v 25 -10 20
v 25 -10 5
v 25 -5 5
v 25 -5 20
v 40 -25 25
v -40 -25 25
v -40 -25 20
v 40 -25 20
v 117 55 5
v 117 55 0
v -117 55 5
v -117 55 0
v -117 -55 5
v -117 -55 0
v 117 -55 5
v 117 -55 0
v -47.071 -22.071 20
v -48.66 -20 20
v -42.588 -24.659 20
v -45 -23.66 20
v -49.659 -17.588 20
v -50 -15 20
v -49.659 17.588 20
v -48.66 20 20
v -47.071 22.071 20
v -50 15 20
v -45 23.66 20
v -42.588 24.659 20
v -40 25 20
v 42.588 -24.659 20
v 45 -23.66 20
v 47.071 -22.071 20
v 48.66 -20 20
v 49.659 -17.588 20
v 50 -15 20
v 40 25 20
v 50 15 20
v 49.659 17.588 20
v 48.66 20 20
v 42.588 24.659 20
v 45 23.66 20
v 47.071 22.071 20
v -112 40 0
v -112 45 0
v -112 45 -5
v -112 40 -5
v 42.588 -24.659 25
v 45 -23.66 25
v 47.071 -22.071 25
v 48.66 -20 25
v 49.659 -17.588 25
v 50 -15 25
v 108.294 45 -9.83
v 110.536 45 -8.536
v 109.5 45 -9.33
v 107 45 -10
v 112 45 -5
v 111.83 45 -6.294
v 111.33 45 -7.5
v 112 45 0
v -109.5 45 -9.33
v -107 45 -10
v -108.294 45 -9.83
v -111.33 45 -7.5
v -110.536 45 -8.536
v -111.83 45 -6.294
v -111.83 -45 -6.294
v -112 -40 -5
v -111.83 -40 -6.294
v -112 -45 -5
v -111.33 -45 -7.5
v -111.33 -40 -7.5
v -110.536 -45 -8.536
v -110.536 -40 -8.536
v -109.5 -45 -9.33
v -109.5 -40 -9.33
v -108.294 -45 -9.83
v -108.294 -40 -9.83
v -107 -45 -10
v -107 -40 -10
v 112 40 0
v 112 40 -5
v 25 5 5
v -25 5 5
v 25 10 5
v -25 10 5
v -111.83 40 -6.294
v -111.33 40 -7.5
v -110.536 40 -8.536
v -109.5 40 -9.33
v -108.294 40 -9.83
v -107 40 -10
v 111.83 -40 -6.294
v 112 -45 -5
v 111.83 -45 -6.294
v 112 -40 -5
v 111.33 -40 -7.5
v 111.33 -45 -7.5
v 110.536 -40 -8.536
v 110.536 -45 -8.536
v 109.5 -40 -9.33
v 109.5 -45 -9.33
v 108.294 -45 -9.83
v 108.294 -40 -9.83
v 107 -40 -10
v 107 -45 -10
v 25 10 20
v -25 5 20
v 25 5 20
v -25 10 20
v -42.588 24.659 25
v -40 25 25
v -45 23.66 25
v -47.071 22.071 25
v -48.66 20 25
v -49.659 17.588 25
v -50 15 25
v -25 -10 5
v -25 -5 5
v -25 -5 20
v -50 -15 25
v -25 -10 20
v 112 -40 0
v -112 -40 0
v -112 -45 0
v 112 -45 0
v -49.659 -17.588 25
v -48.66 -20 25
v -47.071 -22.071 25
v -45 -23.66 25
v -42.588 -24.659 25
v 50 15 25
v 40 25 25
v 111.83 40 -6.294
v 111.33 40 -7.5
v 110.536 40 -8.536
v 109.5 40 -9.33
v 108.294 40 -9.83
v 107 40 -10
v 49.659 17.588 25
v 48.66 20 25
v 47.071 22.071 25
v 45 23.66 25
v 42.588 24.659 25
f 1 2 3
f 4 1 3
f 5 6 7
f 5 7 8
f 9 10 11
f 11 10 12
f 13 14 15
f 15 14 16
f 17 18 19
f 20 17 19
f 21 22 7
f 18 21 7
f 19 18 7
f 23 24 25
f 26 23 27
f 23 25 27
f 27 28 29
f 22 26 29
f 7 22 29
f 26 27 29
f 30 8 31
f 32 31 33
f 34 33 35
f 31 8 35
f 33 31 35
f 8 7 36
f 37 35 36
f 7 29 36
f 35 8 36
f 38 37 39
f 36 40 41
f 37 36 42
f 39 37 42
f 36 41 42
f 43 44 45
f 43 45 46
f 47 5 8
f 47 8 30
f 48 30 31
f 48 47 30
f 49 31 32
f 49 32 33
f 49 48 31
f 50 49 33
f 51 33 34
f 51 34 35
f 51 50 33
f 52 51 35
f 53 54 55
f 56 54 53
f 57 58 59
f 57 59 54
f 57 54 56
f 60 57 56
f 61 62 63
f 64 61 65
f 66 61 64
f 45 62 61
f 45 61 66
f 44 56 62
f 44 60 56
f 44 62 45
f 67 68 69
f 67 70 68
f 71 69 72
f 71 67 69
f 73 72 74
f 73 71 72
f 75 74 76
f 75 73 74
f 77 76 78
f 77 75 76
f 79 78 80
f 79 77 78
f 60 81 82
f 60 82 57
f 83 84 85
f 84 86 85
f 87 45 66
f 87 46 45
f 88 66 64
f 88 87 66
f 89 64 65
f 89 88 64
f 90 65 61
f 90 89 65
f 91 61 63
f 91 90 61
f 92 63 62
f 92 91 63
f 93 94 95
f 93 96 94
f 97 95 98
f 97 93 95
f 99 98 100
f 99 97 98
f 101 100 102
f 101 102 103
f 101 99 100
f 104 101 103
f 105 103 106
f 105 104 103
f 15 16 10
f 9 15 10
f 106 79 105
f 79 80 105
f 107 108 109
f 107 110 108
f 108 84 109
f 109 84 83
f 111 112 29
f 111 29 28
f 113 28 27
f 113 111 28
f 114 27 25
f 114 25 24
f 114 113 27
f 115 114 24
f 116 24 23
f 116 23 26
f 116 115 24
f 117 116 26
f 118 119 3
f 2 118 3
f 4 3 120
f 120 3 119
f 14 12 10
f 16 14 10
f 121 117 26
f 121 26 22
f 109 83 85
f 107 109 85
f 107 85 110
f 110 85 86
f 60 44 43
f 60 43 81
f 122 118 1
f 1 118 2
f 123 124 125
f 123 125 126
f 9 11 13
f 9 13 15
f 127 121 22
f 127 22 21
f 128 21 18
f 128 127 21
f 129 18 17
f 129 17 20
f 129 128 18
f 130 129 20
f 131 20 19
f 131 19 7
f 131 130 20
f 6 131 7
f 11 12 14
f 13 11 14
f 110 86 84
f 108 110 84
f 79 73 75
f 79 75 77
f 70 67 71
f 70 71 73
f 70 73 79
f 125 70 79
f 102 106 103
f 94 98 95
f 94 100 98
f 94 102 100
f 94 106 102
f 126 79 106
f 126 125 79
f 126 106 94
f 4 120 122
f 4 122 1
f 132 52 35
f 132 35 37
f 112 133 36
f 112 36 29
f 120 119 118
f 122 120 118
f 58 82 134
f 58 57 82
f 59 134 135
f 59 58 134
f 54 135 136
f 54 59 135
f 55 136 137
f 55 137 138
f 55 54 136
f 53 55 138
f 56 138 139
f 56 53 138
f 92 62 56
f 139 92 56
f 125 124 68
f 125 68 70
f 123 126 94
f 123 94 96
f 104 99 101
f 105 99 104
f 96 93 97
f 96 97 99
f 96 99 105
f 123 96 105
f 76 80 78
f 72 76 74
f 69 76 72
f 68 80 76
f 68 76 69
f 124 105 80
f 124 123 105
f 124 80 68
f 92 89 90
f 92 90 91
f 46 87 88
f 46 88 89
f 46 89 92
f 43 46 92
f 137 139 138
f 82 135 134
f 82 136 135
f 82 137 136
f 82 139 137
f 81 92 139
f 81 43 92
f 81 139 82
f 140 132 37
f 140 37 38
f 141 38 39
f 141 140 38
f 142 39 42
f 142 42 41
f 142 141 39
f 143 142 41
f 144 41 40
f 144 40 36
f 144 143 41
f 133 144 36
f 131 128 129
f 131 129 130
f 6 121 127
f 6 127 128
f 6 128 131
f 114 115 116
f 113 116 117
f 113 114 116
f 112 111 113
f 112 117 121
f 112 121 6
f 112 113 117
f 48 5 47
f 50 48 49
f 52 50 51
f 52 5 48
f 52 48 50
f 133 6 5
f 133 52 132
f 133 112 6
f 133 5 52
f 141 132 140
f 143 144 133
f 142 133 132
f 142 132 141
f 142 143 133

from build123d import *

# Parameters (mm, degrees)
F1_DEPTH  = 5
F7_DEPTH  = 10
F8_R      = 5
F8_2_R    = 5
F9_DEPTH  = 15
F10_DEPTH = 5


# Not quite as in the source:
# - a feature names something its author has since deleted; it is built from what else it names


with BuildPart() as f1:
    # F0 (on Top) → F1 (new body)
    with BuildSketch(Plane.XY):
        Polygon((117, 55), (0, 55), (-117, 55), (-117, -55), (117, -55), align=None)
    extrude(amount=F1_DEPTH)


with BuildPart() as f7:
    # F2 (on Top) → F7 (new body)
    with BuildSketch(Plane.XY):
        Polygon((-112, -40), (-112, -45), (0, -45), (112, -45), (112, -40), align=None)
    extrude(amount=-F7_DEPTH)

    # F8
    f8_edges = [f7.edges().sort_by_distance(p)[0] for p in [
        (-112, -42.5, -10),
        (112, -42.5, -10),
    ]]
    fillet(f8_edges, radius=F8_R)


with BuildPart() as f7b:
    # F2 (on Top) → F7, piece 2 (new body)
    with BuildSketch(Plane.XY):
        Polygon((112, 45), (0, 45), (-112, 45), (-112, 40), (112, 40), align=None)
    extrude(amount=-F7_DEPTH)

    # F8#2
    f8_2_edges = [f7b.edges().sort_by_distance(p)[0] for p in [
        (112, 42.5, -10),
        (-112, 42.5, -10),
    ]]
    fillet(f8_2_edges, radius=F8_2_R)


with BuildPart() as f9:
    # F6 (on offset) → F9 (new body)
    with BuildSketch(Plane.XY.offset(5)):
        Polygon((25, -10), (25, -5), (0, -5), (-25, -5), (-25, -10), align=None)
    extrude(amount=F9_DEPTH)


with BuildPart() as f9b:
    # F6 (on offset) → F9, piece 2 (new body)
    with BuildSketch(Plane.XY.offset(5)):
        Polygon((-25, 5), (0, 5), (25, 5), (25, 10), (-25, 10), align=None)
    extrude(amount=F9_DEPTH)


with BuildPart() as f10:
    # F4 (on offset) → F10 (new body)
    with BuildSketch(Plane.XY.offset(25)):
        with BuildLine():
            Line((40, 25), (0, 25))
            Line((0, 25), (-40, 25))
            ThreePointArc((-40, 25), (-47.0710678119, 22.0710678119), (-50, 15))
            Line((-50, 15), (-50, -15))
            ThreePointArc((-50, -15), (-47.0710678119, -22.0710678119), (-40, -25))
            Line((-40, -25), (40, -25))
            ThreePointArc((40, -25), (47.0710678119, -22.0710678119), (50, -15))
            Line((50, -15), (50, 15))
            ThreePointArc((50, 15), (47.0710678119, 22.0710678119), (40, 25))
        make_face()
    extrude(amount=-F10_DEPTH)


solid = Compound([f1.part, f7.part, f7b.part, f9.part, f9b.part, f10.part])
